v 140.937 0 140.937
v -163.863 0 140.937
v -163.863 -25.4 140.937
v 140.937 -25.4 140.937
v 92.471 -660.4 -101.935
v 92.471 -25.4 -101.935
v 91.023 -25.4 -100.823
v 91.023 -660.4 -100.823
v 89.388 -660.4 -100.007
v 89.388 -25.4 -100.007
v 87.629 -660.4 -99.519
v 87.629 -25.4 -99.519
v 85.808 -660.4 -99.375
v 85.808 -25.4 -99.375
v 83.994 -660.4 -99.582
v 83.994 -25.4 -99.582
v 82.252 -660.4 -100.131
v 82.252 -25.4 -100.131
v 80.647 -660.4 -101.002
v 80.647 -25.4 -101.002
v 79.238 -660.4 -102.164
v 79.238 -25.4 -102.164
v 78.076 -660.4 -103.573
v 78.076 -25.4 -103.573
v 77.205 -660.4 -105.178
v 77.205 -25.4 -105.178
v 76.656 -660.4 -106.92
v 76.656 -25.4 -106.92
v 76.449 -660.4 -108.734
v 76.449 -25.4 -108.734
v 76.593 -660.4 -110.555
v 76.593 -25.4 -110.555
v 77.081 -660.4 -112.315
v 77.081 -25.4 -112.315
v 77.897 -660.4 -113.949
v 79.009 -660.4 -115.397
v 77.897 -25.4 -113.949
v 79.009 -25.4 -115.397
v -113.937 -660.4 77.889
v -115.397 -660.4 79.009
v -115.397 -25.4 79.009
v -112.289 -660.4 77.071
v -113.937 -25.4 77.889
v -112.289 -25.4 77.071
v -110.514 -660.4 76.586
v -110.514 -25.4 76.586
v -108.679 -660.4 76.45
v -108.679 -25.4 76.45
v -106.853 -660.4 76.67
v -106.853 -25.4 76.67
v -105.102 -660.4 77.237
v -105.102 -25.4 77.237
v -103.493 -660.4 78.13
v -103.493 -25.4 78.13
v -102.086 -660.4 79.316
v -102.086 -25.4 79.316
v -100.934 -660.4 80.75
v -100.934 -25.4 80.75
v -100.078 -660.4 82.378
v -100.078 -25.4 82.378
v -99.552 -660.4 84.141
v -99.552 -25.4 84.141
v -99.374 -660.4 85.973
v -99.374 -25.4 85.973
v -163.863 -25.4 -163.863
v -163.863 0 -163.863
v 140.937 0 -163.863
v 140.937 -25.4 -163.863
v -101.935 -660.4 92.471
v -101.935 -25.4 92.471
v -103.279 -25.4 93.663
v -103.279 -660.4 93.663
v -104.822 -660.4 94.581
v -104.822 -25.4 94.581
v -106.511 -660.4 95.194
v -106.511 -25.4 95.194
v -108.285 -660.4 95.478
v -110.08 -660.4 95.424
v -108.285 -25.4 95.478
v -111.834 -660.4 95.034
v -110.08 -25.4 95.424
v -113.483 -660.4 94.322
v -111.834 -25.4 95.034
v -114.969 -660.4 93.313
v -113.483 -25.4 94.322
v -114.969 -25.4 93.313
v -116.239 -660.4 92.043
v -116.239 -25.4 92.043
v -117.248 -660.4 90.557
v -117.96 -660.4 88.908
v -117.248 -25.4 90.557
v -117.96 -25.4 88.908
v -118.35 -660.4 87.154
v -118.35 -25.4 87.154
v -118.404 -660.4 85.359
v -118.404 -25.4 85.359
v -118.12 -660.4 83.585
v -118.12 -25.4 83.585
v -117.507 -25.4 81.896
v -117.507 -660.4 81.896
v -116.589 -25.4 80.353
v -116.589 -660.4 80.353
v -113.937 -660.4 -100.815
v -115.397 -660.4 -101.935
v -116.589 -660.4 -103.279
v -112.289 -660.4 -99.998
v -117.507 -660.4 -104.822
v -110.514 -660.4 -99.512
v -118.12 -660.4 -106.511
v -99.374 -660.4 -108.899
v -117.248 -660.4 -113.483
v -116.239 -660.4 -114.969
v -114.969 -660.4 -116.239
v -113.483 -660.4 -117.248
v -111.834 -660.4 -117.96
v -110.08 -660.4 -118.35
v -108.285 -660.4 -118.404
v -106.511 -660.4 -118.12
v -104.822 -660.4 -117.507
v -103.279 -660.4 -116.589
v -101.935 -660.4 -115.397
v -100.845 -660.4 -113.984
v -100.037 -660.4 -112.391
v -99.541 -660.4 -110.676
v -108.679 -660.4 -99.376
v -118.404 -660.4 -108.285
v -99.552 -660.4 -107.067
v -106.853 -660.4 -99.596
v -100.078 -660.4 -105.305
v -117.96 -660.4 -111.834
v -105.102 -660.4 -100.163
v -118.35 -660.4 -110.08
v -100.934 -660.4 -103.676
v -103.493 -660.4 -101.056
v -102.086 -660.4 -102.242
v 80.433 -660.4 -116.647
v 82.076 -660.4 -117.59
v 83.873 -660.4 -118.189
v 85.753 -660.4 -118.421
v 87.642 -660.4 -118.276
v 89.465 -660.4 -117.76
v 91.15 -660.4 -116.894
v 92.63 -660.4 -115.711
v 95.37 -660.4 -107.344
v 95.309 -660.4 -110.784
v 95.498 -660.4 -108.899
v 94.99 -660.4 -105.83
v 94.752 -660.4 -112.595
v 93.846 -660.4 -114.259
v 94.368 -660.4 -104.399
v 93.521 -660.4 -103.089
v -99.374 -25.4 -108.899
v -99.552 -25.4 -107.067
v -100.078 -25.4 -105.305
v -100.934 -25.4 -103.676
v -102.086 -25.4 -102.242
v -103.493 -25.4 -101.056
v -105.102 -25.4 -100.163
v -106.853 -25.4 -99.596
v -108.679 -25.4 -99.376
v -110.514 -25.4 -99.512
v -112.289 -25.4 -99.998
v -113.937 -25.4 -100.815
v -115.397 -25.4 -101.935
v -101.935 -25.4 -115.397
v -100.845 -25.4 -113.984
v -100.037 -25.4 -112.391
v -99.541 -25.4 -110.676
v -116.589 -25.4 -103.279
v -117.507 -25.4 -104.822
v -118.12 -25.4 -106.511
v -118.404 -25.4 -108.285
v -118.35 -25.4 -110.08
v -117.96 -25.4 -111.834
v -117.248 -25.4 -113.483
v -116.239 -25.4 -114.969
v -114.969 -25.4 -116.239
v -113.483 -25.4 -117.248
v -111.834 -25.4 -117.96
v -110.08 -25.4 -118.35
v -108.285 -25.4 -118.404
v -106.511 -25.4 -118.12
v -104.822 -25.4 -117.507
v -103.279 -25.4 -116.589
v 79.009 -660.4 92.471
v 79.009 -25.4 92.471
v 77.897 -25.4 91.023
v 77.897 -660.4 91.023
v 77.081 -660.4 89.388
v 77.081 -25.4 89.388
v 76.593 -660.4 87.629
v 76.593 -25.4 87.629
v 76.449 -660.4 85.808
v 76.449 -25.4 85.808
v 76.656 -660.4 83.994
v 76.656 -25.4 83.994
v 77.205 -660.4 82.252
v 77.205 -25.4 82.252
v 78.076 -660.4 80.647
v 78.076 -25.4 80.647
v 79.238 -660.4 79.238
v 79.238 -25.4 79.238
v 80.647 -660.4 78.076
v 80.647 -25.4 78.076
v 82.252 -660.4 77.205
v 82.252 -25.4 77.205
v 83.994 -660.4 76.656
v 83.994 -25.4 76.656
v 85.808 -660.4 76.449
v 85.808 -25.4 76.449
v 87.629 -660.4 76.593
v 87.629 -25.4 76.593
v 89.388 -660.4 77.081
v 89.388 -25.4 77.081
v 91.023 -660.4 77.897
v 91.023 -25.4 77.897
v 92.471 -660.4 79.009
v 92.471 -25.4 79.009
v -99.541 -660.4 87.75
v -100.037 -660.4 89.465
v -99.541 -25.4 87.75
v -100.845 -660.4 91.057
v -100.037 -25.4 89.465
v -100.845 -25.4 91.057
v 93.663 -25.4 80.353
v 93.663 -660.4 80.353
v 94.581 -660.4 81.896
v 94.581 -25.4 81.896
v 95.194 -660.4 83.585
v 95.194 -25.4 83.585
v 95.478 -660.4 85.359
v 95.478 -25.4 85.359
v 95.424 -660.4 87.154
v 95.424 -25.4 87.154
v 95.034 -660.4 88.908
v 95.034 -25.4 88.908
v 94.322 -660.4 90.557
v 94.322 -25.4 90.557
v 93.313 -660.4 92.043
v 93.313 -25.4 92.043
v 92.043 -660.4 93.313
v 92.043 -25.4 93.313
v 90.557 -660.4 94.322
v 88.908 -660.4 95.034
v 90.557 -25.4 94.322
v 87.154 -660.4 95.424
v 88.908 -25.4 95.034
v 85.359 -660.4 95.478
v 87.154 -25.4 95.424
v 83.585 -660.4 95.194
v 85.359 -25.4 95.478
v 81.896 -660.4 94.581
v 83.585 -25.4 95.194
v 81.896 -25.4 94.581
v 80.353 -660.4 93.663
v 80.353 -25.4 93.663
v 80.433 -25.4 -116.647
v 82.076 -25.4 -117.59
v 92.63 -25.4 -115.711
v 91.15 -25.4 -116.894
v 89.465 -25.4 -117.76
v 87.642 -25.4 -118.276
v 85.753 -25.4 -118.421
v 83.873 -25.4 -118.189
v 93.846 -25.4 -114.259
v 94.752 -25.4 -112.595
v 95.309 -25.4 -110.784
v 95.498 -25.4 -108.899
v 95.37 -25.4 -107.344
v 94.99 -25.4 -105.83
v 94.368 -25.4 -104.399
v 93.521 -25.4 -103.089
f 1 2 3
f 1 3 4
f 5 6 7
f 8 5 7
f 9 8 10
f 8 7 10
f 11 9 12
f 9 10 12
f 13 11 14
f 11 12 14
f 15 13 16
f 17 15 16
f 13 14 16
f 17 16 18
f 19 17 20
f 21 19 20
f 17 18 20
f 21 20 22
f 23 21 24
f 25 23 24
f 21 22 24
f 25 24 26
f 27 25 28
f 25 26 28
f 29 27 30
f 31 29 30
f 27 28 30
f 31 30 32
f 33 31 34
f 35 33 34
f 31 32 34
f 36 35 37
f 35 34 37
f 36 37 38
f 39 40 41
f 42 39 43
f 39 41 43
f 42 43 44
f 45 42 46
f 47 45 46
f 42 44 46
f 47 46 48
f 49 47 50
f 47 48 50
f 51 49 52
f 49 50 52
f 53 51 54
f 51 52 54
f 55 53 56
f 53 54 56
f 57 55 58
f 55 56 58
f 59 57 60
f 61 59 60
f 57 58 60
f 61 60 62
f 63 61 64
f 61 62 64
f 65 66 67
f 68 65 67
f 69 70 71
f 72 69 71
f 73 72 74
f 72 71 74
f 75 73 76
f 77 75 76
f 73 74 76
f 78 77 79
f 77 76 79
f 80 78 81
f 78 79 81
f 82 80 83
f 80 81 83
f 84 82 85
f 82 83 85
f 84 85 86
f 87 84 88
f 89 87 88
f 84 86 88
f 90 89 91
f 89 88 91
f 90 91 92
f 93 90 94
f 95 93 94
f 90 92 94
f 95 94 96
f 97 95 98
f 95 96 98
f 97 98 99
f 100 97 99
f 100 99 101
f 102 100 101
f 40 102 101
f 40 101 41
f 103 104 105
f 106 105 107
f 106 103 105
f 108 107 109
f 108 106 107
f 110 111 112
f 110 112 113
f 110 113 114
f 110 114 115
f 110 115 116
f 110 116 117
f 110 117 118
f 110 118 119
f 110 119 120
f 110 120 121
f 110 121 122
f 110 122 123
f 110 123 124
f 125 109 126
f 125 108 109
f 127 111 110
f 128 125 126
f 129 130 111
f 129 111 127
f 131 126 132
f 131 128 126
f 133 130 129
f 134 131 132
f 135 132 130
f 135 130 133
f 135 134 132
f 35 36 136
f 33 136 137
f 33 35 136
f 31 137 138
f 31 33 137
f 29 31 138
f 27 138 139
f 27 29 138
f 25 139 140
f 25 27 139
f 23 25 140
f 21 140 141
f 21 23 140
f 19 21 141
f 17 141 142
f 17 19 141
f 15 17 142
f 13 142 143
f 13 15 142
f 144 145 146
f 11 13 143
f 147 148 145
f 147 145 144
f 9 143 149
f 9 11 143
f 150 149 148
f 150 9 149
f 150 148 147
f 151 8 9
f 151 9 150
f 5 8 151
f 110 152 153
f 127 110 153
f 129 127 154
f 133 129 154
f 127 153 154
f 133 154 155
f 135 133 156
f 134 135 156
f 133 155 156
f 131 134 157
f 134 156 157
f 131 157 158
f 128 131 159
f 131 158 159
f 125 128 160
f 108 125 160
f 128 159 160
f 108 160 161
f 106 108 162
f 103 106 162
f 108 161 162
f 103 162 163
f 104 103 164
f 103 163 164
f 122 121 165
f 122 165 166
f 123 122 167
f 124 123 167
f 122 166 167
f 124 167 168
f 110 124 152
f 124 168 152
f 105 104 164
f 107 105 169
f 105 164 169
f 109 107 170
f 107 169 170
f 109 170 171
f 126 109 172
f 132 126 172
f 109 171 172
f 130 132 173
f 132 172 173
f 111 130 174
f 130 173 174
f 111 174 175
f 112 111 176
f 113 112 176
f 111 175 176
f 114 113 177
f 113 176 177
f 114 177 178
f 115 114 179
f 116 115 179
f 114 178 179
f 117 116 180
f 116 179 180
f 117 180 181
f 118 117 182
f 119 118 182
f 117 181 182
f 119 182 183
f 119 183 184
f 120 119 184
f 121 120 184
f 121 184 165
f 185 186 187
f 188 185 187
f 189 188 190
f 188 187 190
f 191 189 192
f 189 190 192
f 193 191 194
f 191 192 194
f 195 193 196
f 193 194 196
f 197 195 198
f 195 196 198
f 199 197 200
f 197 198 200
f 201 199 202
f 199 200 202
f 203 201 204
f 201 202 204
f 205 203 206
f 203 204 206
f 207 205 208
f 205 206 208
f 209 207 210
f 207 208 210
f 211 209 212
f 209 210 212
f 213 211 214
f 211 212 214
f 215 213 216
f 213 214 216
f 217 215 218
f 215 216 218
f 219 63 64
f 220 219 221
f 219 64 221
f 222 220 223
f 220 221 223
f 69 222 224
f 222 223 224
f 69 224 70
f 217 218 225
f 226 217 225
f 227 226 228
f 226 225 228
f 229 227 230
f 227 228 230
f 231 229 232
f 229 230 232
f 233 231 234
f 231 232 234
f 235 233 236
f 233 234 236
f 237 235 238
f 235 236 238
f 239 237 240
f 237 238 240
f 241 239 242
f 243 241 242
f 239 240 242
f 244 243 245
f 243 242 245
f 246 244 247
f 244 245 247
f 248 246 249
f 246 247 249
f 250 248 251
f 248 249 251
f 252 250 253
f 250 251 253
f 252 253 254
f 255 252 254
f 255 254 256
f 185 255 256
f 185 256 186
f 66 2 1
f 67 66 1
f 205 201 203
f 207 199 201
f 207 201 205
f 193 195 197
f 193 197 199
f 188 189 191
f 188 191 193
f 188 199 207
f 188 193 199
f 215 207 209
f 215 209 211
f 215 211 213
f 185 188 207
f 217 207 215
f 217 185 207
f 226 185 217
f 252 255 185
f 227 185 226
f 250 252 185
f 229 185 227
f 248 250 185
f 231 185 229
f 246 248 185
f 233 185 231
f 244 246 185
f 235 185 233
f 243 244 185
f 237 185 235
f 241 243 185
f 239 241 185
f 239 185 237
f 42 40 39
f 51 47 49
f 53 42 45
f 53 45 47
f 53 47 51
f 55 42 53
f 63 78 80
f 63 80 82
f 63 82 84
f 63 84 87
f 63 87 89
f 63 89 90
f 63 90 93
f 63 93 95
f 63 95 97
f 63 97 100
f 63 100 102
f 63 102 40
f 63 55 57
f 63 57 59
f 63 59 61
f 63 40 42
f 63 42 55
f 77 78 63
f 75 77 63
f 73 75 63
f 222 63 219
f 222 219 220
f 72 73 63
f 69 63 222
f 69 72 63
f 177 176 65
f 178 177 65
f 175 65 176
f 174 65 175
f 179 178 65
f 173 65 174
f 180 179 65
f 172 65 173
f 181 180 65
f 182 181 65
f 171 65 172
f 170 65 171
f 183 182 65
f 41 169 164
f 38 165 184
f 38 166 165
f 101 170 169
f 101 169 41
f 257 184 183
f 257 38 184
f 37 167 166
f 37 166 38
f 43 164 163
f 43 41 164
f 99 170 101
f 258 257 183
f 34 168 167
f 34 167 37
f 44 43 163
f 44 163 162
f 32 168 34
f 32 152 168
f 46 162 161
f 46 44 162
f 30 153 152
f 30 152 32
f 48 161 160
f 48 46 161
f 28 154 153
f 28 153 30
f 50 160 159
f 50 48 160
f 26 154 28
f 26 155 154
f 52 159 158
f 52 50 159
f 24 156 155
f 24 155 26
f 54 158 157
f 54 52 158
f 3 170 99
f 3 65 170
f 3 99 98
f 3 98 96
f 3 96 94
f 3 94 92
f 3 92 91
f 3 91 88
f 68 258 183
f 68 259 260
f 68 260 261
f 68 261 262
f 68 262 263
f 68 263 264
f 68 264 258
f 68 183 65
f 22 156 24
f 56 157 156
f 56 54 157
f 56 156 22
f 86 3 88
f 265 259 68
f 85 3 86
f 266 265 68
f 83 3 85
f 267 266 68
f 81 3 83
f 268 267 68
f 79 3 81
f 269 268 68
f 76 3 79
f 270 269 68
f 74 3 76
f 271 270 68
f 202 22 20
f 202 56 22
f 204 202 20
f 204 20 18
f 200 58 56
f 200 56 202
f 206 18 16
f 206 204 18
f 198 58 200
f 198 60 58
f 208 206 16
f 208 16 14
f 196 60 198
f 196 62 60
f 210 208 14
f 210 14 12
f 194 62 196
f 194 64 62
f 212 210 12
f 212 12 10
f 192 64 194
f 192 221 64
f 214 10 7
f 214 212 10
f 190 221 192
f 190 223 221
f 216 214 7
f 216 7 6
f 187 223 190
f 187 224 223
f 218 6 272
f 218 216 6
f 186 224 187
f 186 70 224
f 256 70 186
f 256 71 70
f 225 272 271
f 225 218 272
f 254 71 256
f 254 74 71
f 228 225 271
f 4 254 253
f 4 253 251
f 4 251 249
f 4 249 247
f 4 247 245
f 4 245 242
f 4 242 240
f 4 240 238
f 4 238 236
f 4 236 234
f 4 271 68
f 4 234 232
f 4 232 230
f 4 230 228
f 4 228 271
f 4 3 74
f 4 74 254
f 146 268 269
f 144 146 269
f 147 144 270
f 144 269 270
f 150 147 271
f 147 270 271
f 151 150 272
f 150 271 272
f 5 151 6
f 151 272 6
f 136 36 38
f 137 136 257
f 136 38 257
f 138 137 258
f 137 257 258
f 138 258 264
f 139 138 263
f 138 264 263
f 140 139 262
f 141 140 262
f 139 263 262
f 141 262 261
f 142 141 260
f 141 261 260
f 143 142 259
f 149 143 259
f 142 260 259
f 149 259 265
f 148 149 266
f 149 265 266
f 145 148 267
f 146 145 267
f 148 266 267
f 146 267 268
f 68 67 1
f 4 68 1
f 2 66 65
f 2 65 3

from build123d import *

# Parameters (mm, degrees)
F0_W     = 304.8
F0_H     = 304.8
F1_DEPTH = 25.4
F2_DEPTH = 660.4


with BuildPart() as f1:
    # F0 (on Front) → F1 (new body)
    with BuildSketch(Plane.XZ):
        with Locations((-11.4630328134, -11.4630328134)):
            Rectangle(F0_W, F0_H)
        with BuildLine():
            ThreePointArc((92.4711311021, 79.0087948248), (117.5894180385, 36.8373497331), (126.3319671866, -11.4630328134))
            ThreePointArc((126.3319671866, -11.4630328134), (117.5894180385, -59.7634153598), (92.4711311021, -101.9348604515))
            ThreePointArc((92.4711311021, -101.9348604515), (94.708384089, -105.1022008793), (95.4977461002, -108.898811727))
            ThreePointArc((95.4977461002, -108.898811727), (89.4651656842, -117.7604498627), (79.0087948248, -115.3971967289))
            ThreePointArc((79.0087948248, -115.3971967289), (-11.4630328134, -149.2580328134), (-101.9348604515, -115.3971967289))
            ThreePointArc((-101.9348604515, -115.3971967289), (-115.6340038178, -115.6340038178), (-115.3971967289, -101.9348604515))
            ThreePointArc((-115.3971967289, -101.9348604515), (-149.2580328134, -11.4630328134), (-115.3971967289, 79.0087948248))
            ThreePointArc((-115.3971967289, 79.0087948248), (-115.6340038178, 92.707938191), (-101.9348604515, 92.4711311021))
            ThreePointArc((-101.9348604515, 92.4711311021), (-11.4630328134, 126.3319671866), (79.0087948248, 92.4711311021))
            ThreePointArc((79.0087948248, 92.4711311021), (89.4651656842, 94.834384236), (95.4977461002, 85.9727461002))
            ThreePointArc((95.4977461002, 85.9727461002), (94.708384089, 82.1761352526), (92.4711311021, 79.0087948248))
        make_face(mode=Mode.SUBTRACT)
        with BuildLine():
            ThreePointArc((92.4711311021, -101.9348604515), (117.5894180385, -59.7634153598), (126.3319671866, -11.4630328134))
            ThreePointArc((126.3319671866, -11.4630328134), (117.5894180385, 36.8373497331), (92.4711311021, 79.0087948248))
            ThreePointArc((92.4711311021, 79.0087948248), (79.2375540094, 79.2375540094), (79.0087948248, 92.4711311021))
            ThreePointArc((79.0087948248, 92.4711311021), (-11.4630328134, 126.3319671866), (-101.9348604515, 92.4711311021))
            ThreePointArc((-101.9348604515, 92.4711311021), (-100.0371735912, 89.4651656842), (-99.373811727, 85.9727461002))
            ThreePointArc((-99.373811727, 85.9727461002), (-105.1022008793, 77.2371081114), (-115.3971967289, 79.0087948248))
            ThreePointArc((-115.3971967289, 79.0087948248), (-149.2580328134, -11.4630328134), (-115.3971967289, -101.9348604515))
            ThreePointArc((-115.3971967289, -101.9348604515), (-105.1022008793, -100.1631737382), (-99.373811727, -108.898811727))
            ThreePointArc((-99.373811727, -108.898811727), (-100.0371735912, -112.391231311), (-101.9348604515, -115.3971967289))
            ThreePointArc((-101.9348604515, -115.3971967289), (-11.4630328134, -149.2580328134), (79.0087948248, -115.3971967289))
            ThreePointArc((79.0087948248, -115.3971967289), (79.2375540094, -102.1636196362), (92.4711311021, -101.9348604515))
        make_face()
        with BuildLine():
            ThreePointArc((79.0087948248, 92.4711311021), (79.2375540094, 79.2375540094), (92.4711311021, 79.0087948248))
            ThreePointArc((92.4711311021, 79.0087948248), (85.9727461002, 85.9727461002), (79.0087948248, 92.4711311021))
        make_face()
    extrude(amount=F1_DEPTH)

    # F0 (on Front) → F2 (join)
    with BuildSketch(Plane.XZ):
        with BuildLine():
            ThreePointArc((79.0087948248, 92.4711311021), (79.2375540094, 79.2375540094), (92.4711311021, 79.0087948248))
            ThreePointArc((92.4711311021, 79.0087948248), (85.9727461002, 85.9727461002), (79.0087948248, 92.4711311021))
        make_face()
        with BuildLine():
            ThreePointArc((79.0087948248, 92.4711311021), (85.9727461002, 85.9727461002), (92.4711311021, 79.0087948248))
            ThreePointArc((92.4711311021, 79.0087948248), (94.708384089, 82.1761352526), (95.4977461002, 85.9727461002))
            ThreePointArc((95.4977461002, 85.9727461002), (89.4651656842, 94.834384236), (79.0087948248, 92.4711311021))
        make_face()
        with BuildLine():
            ThreePointArc((95.4977461002, -108.898811727), (94.708384089, -105.1022008793), (92.4711311021, -101.9348604515))
            ThreePointArc((92.4711311021, -101.9348604515), (85.9727461002, -108.898811727), (79.0087948248, -115.3971967289))
            ThreePointArc((79.0087948248, -115.3971967289), (89.4651656842, -117.7604498627), (95.4977461002, -108.898811727))
        make_face()
        with BuildLine():
            ThreePointArc((79.0087948248, -115.3971967289), (85.9727461002, -108.898811727), (92.4711311021, -101.9348604515))
            ThreePointArc((92.4711311021, -101.9348604515), (79.2375540094, -102.1636196362), (79.0087948248, -115.3971967289))
        make_face()
        with BuildLine():
            ThreePointArc((-99.373811727, 85.9727461002), (-100.0371735912, 89.4651656842), (-101.9348604515, 92.4711311021))
            ThreePointArc((-101.9348604515, 92.4711311021), (-108.898811727, 85.9727461002), (-115.3971967289, 79.0087948248))
            ThreePointArc((-115.3971967289, 79.0087948248), (-105.1022008793, 77.2371081114), (-99.373811727, 85.9727461002))
        make_face()
        with BuildLine():
            ThreePointArc((-115.3971967289, 79.0087948248), (-108.898811727, 85.9727461002), (-101.9348604515, 92.4711311021))
            ThreePointArc((-101.9348604515, 92.4711311021), (-115.6340038178, 92.707938191), (-115.3971967289, 79.0087948248))
        make_face()
        with BuildLine():
            ThreePointArc((-115.3971967289, -101.9348604515), (-115.6340038178, -115.6340038178), (-101.9348604515, -115.3971967289))
            ThreePointArc((-101.9348604515, -115.3971967289), (-108.898811727, -108.898811727), (-115.3971967289, -101.9348604515))
        make_face()
        with BuildLine():
            ThreePointArc((-115.3971967289, -101.9348604515), (-108.898811727, -108.898811727), (-101.9348604515, -115.3971967289))
            ThreePointArc((-101.9348604515, -115.3971967289), (-100.0371735912, -112.391231311), (-99.373811727, -108.898811727))
            ThreePointArc((-99.373811727, -108.898811727), (-105.1022008793, -100.1631737382), (-115.3971967289, -101.9348604515))
        make_face()
    extrude(amount=F2_DEPTH)


solid = f1.part
